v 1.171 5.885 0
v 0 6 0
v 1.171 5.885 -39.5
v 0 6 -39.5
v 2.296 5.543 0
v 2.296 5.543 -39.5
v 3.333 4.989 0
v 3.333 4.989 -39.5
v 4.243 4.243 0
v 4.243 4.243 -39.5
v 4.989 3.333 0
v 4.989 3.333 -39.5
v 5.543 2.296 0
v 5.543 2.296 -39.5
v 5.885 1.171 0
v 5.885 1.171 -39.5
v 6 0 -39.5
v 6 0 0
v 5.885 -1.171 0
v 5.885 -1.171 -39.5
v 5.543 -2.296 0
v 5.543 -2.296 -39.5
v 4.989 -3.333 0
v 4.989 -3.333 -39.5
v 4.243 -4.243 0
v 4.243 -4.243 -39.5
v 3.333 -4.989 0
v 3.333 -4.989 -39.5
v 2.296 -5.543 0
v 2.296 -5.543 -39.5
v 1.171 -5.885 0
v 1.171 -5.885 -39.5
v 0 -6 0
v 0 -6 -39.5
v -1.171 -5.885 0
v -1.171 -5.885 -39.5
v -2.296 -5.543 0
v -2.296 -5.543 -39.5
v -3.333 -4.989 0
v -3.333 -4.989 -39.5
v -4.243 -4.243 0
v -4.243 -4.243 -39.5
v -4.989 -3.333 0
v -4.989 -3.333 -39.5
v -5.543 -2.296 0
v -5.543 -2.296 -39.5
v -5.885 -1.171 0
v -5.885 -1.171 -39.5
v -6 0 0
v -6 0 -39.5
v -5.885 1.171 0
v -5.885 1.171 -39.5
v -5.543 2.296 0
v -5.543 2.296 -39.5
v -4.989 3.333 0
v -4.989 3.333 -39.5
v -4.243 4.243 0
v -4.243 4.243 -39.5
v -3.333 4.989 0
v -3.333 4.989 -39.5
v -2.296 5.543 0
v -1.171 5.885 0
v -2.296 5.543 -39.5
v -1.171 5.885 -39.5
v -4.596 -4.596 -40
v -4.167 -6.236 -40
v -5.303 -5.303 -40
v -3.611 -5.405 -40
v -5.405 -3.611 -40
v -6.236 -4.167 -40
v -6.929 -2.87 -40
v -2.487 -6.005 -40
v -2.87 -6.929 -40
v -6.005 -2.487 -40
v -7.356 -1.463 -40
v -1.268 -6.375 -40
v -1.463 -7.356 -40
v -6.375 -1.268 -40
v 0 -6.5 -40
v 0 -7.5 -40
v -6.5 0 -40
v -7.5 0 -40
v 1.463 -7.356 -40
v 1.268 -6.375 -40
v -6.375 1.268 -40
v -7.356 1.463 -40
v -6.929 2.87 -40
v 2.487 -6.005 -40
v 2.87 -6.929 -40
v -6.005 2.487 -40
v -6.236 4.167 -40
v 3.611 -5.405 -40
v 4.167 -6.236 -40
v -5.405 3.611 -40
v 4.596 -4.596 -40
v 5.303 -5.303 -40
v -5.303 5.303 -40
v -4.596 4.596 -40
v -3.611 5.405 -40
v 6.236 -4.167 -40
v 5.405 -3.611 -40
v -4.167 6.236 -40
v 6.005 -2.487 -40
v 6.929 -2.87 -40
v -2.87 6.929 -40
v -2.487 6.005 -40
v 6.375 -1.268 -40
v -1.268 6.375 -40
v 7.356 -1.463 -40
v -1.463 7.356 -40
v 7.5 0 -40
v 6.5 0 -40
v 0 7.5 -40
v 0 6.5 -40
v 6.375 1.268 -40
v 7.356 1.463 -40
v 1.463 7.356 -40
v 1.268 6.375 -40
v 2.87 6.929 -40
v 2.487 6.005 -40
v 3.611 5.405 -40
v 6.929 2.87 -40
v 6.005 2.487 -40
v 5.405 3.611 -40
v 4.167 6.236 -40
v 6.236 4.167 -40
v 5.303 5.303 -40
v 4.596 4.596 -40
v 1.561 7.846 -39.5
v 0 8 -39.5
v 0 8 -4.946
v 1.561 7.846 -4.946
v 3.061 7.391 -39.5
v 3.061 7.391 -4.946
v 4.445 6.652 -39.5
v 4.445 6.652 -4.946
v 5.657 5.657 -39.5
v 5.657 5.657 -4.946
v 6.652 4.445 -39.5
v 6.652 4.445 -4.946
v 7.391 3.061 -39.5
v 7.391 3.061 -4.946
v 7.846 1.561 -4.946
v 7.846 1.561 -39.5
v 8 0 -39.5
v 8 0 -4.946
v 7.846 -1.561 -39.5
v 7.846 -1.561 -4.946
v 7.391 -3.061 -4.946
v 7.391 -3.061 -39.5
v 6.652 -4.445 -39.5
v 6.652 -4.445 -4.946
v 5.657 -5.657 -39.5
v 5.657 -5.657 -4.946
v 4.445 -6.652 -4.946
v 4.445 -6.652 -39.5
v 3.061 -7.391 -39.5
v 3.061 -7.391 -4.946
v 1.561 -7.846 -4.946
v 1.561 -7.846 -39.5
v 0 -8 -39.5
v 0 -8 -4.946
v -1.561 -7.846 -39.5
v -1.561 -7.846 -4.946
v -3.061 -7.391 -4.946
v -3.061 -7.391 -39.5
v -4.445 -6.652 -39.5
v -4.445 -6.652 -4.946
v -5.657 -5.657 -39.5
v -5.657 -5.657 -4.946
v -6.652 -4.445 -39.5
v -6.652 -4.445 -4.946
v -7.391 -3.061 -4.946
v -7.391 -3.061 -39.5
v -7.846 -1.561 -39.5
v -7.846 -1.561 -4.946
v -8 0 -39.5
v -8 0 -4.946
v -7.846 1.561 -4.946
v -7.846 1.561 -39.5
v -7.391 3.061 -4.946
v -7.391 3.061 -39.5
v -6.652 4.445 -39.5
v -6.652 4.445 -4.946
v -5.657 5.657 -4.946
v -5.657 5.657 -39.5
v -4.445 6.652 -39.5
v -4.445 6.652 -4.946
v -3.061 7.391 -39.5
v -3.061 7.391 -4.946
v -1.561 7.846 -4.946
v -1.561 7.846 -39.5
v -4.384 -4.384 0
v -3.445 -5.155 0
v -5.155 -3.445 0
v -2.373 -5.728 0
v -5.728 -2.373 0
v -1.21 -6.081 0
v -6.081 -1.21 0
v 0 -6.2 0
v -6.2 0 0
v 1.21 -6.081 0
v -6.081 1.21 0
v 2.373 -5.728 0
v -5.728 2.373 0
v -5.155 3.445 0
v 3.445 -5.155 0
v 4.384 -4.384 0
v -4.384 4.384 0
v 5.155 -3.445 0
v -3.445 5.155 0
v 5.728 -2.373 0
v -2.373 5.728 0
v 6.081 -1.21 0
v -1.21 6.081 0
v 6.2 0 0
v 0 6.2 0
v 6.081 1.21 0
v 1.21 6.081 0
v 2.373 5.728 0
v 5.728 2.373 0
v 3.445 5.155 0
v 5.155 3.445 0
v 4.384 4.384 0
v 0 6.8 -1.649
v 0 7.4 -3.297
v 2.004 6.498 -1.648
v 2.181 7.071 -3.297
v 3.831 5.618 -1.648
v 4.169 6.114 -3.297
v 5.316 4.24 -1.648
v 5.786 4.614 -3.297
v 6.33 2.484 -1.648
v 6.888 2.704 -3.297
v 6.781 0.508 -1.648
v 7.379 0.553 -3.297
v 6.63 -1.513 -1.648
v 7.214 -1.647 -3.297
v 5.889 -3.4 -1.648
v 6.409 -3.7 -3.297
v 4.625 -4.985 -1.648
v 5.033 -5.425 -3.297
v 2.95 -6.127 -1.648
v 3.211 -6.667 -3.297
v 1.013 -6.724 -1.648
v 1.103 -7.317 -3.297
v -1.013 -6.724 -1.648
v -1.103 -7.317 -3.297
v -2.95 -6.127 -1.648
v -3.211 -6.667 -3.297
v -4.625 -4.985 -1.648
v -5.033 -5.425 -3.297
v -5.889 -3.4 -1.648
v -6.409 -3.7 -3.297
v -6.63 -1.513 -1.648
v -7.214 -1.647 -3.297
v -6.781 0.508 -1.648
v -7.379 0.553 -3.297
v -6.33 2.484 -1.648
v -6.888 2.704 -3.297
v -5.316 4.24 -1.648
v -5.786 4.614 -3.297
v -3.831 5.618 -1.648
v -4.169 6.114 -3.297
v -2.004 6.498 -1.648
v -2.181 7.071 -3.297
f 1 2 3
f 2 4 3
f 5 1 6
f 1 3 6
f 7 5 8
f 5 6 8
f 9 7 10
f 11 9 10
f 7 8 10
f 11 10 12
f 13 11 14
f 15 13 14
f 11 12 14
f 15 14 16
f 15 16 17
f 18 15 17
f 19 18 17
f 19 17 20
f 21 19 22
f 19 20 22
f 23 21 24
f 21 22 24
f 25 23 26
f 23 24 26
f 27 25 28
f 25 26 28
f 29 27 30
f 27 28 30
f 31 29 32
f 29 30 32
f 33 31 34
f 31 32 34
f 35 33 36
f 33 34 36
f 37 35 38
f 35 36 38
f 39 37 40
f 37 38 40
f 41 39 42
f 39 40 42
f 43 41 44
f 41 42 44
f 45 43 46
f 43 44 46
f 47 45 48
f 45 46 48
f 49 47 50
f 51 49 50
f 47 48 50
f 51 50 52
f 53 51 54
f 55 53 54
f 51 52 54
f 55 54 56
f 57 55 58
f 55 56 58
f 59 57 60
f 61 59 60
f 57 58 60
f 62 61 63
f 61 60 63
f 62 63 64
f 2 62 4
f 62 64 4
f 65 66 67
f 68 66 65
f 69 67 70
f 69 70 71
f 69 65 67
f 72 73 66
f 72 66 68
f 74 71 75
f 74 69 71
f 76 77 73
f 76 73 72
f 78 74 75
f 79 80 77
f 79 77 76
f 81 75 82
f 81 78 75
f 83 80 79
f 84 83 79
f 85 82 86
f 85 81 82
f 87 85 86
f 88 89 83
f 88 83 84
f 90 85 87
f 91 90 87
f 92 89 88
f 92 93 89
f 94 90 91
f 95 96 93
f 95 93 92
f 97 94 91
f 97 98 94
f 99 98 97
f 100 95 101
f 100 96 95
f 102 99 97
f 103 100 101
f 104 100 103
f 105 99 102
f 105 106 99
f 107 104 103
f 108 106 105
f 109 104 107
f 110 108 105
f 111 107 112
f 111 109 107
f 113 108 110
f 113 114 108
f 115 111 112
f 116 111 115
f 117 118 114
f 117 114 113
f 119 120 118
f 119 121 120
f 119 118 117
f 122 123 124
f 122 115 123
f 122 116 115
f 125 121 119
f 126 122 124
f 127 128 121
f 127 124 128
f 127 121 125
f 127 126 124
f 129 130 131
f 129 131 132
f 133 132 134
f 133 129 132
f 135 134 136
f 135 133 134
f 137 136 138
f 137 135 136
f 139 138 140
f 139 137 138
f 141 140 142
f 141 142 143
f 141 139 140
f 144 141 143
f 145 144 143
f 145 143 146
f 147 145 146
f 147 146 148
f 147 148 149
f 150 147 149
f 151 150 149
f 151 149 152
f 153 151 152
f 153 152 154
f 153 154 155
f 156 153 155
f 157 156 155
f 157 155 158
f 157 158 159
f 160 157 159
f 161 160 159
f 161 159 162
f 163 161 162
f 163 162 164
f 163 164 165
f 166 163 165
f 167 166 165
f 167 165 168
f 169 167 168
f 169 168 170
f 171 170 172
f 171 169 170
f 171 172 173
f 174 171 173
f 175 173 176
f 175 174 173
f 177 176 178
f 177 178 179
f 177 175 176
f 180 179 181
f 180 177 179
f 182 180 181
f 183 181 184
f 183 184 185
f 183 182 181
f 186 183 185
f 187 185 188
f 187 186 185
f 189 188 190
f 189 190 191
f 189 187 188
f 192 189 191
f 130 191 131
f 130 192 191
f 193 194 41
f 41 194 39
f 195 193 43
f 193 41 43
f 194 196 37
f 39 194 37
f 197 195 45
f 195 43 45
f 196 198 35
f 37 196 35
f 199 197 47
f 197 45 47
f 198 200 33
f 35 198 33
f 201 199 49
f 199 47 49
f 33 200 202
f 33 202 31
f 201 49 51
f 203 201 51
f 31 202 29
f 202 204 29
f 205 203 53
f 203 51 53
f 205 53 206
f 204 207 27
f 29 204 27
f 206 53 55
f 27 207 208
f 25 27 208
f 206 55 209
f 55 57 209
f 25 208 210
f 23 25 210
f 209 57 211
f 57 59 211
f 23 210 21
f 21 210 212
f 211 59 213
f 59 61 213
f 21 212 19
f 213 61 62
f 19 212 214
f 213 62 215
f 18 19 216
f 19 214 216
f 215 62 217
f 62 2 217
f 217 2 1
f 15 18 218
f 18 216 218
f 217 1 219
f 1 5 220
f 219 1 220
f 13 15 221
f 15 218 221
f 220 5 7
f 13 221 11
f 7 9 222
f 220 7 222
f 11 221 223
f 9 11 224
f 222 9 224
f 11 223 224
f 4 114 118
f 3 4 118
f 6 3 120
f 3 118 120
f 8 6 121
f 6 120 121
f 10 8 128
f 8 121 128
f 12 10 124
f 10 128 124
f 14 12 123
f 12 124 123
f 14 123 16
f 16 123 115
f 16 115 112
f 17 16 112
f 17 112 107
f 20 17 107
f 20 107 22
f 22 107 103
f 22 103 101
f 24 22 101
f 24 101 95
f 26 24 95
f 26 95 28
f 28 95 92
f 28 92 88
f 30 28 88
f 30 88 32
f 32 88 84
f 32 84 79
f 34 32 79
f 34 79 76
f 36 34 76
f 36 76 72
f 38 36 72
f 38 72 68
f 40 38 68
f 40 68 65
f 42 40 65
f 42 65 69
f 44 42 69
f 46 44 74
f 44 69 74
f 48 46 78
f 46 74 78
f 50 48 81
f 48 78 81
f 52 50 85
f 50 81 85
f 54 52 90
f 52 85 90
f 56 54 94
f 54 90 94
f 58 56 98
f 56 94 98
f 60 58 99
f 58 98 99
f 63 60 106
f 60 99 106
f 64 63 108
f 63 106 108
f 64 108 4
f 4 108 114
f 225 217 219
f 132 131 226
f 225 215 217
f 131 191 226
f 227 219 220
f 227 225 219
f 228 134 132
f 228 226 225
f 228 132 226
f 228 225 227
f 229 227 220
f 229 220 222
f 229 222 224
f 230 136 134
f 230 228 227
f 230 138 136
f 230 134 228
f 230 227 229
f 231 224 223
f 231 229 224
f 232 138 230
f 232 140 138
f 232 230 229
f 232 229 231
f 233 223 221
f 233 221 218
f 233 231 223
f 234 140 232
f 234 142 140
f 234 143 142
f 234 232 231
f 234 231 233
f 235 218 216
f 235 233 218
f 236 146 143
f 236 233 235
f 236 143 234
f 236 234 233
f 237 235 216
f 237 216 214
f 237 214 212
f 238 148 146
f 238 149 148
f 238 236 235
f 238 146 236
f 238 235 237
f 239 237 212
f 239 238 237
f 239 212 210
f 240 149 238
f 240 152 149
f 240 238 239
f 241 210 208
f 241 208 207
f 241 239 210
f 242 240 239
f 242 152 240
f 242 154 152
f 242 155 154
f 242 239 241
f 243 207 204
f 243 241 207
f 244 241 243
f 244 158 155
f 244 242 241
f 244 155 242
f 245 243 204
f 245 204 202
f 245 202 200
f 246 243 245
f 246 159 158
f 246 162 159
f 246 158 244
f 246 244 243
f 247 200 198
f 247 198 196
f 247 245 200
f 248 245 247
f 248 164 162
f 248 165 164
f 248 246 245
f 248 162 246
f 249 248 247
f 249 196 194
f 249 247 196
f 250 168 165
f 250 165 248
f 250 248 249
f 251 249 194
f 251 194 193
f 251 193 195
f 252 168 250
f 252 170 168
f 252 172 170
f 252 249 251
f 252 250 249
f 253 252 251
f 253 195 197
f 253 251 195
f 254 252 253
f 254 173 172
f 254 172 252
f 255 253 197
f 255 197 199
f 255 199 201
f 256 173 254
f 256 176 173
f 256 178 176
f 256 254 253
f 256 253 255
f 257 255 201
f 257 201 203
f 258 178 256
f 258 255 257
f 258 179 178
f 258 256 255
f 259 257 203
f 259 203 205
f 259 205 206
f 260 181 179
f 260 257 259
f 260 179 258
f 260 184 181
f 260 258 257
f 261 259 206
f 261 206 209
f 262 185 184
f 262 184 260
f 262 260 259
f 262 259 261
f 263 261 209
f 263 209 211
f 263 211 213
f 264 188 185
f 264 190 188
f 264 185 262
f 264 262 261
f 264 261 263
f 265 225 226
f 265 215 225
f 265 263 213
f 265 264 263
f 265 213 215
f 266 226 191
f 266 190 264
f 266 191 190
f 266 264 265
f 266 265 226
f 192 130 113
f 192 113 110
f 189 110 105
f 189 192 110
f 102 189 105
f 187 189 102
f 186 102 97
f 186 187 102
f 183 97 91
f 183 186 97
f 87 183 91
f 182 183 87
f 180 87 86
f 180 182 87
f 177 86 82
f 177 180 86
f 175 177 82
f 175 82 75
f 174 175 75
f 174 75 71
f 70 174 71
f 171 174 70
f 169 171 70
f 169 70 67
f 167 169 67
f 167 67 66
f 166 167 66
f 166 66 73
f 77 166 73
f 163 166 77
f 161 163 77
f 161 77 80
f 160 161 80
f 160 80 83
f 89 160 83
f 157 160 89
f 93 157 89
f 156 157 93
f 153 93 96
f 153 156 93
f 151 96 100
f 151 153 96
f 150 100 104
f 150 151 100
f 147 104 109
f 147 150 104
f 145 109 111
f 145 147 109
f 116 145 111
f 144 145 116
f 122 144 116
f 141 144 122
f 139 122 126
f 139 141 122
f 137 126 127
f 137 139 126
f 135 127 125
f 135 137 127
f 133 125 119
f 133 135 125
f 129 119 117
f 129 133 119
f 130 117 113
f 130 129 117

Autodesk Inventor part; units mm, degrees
ref_plane "YZ Plane" through (0, 0, 0) normal (1, 0, 0) x (0, 1, 0)
ref_plane "XZ Plane" through (0, 0, 0) normal (0, 1, 0) x (-1, 0, 0)
ref_plane "XY Plane" through (0, 0, 0) normal (0, 0, 1) x (1, 0, 0)
sketch "Esquisse1" plane through (0, 0, 0) normal (1, 0, 0) x (0, 1, 0)
  line L0 (0, 0) -> (0, -21.1525)
  line L1 (6, 0) -> (6, -40)
  line L2 (6.2, 0) -> (8, -4.9455)
  line L3 (8, -4.9455) -> (8, -40)
  line L4 (6, -40) -> (8, -40)
  line L5 (6, 0) -> (6.2, 0)
  dimension "d0" = 160
  dimension "d2" = 16
  dimension "d4" = 40
  dimension "d6" = 2
  dimension "d7" = 0.2
revolve "Révolution1" add sketch "Esquisse1" angle 360 about axis through (0, 0, 0) along (0, 0, -1)
chamfer "Chanfrein1" distance 0.5 angle 45 2 edges at (0, -6, -40) (0, -8, -40)
properties part number "douille" material "Aluminium 6061"
